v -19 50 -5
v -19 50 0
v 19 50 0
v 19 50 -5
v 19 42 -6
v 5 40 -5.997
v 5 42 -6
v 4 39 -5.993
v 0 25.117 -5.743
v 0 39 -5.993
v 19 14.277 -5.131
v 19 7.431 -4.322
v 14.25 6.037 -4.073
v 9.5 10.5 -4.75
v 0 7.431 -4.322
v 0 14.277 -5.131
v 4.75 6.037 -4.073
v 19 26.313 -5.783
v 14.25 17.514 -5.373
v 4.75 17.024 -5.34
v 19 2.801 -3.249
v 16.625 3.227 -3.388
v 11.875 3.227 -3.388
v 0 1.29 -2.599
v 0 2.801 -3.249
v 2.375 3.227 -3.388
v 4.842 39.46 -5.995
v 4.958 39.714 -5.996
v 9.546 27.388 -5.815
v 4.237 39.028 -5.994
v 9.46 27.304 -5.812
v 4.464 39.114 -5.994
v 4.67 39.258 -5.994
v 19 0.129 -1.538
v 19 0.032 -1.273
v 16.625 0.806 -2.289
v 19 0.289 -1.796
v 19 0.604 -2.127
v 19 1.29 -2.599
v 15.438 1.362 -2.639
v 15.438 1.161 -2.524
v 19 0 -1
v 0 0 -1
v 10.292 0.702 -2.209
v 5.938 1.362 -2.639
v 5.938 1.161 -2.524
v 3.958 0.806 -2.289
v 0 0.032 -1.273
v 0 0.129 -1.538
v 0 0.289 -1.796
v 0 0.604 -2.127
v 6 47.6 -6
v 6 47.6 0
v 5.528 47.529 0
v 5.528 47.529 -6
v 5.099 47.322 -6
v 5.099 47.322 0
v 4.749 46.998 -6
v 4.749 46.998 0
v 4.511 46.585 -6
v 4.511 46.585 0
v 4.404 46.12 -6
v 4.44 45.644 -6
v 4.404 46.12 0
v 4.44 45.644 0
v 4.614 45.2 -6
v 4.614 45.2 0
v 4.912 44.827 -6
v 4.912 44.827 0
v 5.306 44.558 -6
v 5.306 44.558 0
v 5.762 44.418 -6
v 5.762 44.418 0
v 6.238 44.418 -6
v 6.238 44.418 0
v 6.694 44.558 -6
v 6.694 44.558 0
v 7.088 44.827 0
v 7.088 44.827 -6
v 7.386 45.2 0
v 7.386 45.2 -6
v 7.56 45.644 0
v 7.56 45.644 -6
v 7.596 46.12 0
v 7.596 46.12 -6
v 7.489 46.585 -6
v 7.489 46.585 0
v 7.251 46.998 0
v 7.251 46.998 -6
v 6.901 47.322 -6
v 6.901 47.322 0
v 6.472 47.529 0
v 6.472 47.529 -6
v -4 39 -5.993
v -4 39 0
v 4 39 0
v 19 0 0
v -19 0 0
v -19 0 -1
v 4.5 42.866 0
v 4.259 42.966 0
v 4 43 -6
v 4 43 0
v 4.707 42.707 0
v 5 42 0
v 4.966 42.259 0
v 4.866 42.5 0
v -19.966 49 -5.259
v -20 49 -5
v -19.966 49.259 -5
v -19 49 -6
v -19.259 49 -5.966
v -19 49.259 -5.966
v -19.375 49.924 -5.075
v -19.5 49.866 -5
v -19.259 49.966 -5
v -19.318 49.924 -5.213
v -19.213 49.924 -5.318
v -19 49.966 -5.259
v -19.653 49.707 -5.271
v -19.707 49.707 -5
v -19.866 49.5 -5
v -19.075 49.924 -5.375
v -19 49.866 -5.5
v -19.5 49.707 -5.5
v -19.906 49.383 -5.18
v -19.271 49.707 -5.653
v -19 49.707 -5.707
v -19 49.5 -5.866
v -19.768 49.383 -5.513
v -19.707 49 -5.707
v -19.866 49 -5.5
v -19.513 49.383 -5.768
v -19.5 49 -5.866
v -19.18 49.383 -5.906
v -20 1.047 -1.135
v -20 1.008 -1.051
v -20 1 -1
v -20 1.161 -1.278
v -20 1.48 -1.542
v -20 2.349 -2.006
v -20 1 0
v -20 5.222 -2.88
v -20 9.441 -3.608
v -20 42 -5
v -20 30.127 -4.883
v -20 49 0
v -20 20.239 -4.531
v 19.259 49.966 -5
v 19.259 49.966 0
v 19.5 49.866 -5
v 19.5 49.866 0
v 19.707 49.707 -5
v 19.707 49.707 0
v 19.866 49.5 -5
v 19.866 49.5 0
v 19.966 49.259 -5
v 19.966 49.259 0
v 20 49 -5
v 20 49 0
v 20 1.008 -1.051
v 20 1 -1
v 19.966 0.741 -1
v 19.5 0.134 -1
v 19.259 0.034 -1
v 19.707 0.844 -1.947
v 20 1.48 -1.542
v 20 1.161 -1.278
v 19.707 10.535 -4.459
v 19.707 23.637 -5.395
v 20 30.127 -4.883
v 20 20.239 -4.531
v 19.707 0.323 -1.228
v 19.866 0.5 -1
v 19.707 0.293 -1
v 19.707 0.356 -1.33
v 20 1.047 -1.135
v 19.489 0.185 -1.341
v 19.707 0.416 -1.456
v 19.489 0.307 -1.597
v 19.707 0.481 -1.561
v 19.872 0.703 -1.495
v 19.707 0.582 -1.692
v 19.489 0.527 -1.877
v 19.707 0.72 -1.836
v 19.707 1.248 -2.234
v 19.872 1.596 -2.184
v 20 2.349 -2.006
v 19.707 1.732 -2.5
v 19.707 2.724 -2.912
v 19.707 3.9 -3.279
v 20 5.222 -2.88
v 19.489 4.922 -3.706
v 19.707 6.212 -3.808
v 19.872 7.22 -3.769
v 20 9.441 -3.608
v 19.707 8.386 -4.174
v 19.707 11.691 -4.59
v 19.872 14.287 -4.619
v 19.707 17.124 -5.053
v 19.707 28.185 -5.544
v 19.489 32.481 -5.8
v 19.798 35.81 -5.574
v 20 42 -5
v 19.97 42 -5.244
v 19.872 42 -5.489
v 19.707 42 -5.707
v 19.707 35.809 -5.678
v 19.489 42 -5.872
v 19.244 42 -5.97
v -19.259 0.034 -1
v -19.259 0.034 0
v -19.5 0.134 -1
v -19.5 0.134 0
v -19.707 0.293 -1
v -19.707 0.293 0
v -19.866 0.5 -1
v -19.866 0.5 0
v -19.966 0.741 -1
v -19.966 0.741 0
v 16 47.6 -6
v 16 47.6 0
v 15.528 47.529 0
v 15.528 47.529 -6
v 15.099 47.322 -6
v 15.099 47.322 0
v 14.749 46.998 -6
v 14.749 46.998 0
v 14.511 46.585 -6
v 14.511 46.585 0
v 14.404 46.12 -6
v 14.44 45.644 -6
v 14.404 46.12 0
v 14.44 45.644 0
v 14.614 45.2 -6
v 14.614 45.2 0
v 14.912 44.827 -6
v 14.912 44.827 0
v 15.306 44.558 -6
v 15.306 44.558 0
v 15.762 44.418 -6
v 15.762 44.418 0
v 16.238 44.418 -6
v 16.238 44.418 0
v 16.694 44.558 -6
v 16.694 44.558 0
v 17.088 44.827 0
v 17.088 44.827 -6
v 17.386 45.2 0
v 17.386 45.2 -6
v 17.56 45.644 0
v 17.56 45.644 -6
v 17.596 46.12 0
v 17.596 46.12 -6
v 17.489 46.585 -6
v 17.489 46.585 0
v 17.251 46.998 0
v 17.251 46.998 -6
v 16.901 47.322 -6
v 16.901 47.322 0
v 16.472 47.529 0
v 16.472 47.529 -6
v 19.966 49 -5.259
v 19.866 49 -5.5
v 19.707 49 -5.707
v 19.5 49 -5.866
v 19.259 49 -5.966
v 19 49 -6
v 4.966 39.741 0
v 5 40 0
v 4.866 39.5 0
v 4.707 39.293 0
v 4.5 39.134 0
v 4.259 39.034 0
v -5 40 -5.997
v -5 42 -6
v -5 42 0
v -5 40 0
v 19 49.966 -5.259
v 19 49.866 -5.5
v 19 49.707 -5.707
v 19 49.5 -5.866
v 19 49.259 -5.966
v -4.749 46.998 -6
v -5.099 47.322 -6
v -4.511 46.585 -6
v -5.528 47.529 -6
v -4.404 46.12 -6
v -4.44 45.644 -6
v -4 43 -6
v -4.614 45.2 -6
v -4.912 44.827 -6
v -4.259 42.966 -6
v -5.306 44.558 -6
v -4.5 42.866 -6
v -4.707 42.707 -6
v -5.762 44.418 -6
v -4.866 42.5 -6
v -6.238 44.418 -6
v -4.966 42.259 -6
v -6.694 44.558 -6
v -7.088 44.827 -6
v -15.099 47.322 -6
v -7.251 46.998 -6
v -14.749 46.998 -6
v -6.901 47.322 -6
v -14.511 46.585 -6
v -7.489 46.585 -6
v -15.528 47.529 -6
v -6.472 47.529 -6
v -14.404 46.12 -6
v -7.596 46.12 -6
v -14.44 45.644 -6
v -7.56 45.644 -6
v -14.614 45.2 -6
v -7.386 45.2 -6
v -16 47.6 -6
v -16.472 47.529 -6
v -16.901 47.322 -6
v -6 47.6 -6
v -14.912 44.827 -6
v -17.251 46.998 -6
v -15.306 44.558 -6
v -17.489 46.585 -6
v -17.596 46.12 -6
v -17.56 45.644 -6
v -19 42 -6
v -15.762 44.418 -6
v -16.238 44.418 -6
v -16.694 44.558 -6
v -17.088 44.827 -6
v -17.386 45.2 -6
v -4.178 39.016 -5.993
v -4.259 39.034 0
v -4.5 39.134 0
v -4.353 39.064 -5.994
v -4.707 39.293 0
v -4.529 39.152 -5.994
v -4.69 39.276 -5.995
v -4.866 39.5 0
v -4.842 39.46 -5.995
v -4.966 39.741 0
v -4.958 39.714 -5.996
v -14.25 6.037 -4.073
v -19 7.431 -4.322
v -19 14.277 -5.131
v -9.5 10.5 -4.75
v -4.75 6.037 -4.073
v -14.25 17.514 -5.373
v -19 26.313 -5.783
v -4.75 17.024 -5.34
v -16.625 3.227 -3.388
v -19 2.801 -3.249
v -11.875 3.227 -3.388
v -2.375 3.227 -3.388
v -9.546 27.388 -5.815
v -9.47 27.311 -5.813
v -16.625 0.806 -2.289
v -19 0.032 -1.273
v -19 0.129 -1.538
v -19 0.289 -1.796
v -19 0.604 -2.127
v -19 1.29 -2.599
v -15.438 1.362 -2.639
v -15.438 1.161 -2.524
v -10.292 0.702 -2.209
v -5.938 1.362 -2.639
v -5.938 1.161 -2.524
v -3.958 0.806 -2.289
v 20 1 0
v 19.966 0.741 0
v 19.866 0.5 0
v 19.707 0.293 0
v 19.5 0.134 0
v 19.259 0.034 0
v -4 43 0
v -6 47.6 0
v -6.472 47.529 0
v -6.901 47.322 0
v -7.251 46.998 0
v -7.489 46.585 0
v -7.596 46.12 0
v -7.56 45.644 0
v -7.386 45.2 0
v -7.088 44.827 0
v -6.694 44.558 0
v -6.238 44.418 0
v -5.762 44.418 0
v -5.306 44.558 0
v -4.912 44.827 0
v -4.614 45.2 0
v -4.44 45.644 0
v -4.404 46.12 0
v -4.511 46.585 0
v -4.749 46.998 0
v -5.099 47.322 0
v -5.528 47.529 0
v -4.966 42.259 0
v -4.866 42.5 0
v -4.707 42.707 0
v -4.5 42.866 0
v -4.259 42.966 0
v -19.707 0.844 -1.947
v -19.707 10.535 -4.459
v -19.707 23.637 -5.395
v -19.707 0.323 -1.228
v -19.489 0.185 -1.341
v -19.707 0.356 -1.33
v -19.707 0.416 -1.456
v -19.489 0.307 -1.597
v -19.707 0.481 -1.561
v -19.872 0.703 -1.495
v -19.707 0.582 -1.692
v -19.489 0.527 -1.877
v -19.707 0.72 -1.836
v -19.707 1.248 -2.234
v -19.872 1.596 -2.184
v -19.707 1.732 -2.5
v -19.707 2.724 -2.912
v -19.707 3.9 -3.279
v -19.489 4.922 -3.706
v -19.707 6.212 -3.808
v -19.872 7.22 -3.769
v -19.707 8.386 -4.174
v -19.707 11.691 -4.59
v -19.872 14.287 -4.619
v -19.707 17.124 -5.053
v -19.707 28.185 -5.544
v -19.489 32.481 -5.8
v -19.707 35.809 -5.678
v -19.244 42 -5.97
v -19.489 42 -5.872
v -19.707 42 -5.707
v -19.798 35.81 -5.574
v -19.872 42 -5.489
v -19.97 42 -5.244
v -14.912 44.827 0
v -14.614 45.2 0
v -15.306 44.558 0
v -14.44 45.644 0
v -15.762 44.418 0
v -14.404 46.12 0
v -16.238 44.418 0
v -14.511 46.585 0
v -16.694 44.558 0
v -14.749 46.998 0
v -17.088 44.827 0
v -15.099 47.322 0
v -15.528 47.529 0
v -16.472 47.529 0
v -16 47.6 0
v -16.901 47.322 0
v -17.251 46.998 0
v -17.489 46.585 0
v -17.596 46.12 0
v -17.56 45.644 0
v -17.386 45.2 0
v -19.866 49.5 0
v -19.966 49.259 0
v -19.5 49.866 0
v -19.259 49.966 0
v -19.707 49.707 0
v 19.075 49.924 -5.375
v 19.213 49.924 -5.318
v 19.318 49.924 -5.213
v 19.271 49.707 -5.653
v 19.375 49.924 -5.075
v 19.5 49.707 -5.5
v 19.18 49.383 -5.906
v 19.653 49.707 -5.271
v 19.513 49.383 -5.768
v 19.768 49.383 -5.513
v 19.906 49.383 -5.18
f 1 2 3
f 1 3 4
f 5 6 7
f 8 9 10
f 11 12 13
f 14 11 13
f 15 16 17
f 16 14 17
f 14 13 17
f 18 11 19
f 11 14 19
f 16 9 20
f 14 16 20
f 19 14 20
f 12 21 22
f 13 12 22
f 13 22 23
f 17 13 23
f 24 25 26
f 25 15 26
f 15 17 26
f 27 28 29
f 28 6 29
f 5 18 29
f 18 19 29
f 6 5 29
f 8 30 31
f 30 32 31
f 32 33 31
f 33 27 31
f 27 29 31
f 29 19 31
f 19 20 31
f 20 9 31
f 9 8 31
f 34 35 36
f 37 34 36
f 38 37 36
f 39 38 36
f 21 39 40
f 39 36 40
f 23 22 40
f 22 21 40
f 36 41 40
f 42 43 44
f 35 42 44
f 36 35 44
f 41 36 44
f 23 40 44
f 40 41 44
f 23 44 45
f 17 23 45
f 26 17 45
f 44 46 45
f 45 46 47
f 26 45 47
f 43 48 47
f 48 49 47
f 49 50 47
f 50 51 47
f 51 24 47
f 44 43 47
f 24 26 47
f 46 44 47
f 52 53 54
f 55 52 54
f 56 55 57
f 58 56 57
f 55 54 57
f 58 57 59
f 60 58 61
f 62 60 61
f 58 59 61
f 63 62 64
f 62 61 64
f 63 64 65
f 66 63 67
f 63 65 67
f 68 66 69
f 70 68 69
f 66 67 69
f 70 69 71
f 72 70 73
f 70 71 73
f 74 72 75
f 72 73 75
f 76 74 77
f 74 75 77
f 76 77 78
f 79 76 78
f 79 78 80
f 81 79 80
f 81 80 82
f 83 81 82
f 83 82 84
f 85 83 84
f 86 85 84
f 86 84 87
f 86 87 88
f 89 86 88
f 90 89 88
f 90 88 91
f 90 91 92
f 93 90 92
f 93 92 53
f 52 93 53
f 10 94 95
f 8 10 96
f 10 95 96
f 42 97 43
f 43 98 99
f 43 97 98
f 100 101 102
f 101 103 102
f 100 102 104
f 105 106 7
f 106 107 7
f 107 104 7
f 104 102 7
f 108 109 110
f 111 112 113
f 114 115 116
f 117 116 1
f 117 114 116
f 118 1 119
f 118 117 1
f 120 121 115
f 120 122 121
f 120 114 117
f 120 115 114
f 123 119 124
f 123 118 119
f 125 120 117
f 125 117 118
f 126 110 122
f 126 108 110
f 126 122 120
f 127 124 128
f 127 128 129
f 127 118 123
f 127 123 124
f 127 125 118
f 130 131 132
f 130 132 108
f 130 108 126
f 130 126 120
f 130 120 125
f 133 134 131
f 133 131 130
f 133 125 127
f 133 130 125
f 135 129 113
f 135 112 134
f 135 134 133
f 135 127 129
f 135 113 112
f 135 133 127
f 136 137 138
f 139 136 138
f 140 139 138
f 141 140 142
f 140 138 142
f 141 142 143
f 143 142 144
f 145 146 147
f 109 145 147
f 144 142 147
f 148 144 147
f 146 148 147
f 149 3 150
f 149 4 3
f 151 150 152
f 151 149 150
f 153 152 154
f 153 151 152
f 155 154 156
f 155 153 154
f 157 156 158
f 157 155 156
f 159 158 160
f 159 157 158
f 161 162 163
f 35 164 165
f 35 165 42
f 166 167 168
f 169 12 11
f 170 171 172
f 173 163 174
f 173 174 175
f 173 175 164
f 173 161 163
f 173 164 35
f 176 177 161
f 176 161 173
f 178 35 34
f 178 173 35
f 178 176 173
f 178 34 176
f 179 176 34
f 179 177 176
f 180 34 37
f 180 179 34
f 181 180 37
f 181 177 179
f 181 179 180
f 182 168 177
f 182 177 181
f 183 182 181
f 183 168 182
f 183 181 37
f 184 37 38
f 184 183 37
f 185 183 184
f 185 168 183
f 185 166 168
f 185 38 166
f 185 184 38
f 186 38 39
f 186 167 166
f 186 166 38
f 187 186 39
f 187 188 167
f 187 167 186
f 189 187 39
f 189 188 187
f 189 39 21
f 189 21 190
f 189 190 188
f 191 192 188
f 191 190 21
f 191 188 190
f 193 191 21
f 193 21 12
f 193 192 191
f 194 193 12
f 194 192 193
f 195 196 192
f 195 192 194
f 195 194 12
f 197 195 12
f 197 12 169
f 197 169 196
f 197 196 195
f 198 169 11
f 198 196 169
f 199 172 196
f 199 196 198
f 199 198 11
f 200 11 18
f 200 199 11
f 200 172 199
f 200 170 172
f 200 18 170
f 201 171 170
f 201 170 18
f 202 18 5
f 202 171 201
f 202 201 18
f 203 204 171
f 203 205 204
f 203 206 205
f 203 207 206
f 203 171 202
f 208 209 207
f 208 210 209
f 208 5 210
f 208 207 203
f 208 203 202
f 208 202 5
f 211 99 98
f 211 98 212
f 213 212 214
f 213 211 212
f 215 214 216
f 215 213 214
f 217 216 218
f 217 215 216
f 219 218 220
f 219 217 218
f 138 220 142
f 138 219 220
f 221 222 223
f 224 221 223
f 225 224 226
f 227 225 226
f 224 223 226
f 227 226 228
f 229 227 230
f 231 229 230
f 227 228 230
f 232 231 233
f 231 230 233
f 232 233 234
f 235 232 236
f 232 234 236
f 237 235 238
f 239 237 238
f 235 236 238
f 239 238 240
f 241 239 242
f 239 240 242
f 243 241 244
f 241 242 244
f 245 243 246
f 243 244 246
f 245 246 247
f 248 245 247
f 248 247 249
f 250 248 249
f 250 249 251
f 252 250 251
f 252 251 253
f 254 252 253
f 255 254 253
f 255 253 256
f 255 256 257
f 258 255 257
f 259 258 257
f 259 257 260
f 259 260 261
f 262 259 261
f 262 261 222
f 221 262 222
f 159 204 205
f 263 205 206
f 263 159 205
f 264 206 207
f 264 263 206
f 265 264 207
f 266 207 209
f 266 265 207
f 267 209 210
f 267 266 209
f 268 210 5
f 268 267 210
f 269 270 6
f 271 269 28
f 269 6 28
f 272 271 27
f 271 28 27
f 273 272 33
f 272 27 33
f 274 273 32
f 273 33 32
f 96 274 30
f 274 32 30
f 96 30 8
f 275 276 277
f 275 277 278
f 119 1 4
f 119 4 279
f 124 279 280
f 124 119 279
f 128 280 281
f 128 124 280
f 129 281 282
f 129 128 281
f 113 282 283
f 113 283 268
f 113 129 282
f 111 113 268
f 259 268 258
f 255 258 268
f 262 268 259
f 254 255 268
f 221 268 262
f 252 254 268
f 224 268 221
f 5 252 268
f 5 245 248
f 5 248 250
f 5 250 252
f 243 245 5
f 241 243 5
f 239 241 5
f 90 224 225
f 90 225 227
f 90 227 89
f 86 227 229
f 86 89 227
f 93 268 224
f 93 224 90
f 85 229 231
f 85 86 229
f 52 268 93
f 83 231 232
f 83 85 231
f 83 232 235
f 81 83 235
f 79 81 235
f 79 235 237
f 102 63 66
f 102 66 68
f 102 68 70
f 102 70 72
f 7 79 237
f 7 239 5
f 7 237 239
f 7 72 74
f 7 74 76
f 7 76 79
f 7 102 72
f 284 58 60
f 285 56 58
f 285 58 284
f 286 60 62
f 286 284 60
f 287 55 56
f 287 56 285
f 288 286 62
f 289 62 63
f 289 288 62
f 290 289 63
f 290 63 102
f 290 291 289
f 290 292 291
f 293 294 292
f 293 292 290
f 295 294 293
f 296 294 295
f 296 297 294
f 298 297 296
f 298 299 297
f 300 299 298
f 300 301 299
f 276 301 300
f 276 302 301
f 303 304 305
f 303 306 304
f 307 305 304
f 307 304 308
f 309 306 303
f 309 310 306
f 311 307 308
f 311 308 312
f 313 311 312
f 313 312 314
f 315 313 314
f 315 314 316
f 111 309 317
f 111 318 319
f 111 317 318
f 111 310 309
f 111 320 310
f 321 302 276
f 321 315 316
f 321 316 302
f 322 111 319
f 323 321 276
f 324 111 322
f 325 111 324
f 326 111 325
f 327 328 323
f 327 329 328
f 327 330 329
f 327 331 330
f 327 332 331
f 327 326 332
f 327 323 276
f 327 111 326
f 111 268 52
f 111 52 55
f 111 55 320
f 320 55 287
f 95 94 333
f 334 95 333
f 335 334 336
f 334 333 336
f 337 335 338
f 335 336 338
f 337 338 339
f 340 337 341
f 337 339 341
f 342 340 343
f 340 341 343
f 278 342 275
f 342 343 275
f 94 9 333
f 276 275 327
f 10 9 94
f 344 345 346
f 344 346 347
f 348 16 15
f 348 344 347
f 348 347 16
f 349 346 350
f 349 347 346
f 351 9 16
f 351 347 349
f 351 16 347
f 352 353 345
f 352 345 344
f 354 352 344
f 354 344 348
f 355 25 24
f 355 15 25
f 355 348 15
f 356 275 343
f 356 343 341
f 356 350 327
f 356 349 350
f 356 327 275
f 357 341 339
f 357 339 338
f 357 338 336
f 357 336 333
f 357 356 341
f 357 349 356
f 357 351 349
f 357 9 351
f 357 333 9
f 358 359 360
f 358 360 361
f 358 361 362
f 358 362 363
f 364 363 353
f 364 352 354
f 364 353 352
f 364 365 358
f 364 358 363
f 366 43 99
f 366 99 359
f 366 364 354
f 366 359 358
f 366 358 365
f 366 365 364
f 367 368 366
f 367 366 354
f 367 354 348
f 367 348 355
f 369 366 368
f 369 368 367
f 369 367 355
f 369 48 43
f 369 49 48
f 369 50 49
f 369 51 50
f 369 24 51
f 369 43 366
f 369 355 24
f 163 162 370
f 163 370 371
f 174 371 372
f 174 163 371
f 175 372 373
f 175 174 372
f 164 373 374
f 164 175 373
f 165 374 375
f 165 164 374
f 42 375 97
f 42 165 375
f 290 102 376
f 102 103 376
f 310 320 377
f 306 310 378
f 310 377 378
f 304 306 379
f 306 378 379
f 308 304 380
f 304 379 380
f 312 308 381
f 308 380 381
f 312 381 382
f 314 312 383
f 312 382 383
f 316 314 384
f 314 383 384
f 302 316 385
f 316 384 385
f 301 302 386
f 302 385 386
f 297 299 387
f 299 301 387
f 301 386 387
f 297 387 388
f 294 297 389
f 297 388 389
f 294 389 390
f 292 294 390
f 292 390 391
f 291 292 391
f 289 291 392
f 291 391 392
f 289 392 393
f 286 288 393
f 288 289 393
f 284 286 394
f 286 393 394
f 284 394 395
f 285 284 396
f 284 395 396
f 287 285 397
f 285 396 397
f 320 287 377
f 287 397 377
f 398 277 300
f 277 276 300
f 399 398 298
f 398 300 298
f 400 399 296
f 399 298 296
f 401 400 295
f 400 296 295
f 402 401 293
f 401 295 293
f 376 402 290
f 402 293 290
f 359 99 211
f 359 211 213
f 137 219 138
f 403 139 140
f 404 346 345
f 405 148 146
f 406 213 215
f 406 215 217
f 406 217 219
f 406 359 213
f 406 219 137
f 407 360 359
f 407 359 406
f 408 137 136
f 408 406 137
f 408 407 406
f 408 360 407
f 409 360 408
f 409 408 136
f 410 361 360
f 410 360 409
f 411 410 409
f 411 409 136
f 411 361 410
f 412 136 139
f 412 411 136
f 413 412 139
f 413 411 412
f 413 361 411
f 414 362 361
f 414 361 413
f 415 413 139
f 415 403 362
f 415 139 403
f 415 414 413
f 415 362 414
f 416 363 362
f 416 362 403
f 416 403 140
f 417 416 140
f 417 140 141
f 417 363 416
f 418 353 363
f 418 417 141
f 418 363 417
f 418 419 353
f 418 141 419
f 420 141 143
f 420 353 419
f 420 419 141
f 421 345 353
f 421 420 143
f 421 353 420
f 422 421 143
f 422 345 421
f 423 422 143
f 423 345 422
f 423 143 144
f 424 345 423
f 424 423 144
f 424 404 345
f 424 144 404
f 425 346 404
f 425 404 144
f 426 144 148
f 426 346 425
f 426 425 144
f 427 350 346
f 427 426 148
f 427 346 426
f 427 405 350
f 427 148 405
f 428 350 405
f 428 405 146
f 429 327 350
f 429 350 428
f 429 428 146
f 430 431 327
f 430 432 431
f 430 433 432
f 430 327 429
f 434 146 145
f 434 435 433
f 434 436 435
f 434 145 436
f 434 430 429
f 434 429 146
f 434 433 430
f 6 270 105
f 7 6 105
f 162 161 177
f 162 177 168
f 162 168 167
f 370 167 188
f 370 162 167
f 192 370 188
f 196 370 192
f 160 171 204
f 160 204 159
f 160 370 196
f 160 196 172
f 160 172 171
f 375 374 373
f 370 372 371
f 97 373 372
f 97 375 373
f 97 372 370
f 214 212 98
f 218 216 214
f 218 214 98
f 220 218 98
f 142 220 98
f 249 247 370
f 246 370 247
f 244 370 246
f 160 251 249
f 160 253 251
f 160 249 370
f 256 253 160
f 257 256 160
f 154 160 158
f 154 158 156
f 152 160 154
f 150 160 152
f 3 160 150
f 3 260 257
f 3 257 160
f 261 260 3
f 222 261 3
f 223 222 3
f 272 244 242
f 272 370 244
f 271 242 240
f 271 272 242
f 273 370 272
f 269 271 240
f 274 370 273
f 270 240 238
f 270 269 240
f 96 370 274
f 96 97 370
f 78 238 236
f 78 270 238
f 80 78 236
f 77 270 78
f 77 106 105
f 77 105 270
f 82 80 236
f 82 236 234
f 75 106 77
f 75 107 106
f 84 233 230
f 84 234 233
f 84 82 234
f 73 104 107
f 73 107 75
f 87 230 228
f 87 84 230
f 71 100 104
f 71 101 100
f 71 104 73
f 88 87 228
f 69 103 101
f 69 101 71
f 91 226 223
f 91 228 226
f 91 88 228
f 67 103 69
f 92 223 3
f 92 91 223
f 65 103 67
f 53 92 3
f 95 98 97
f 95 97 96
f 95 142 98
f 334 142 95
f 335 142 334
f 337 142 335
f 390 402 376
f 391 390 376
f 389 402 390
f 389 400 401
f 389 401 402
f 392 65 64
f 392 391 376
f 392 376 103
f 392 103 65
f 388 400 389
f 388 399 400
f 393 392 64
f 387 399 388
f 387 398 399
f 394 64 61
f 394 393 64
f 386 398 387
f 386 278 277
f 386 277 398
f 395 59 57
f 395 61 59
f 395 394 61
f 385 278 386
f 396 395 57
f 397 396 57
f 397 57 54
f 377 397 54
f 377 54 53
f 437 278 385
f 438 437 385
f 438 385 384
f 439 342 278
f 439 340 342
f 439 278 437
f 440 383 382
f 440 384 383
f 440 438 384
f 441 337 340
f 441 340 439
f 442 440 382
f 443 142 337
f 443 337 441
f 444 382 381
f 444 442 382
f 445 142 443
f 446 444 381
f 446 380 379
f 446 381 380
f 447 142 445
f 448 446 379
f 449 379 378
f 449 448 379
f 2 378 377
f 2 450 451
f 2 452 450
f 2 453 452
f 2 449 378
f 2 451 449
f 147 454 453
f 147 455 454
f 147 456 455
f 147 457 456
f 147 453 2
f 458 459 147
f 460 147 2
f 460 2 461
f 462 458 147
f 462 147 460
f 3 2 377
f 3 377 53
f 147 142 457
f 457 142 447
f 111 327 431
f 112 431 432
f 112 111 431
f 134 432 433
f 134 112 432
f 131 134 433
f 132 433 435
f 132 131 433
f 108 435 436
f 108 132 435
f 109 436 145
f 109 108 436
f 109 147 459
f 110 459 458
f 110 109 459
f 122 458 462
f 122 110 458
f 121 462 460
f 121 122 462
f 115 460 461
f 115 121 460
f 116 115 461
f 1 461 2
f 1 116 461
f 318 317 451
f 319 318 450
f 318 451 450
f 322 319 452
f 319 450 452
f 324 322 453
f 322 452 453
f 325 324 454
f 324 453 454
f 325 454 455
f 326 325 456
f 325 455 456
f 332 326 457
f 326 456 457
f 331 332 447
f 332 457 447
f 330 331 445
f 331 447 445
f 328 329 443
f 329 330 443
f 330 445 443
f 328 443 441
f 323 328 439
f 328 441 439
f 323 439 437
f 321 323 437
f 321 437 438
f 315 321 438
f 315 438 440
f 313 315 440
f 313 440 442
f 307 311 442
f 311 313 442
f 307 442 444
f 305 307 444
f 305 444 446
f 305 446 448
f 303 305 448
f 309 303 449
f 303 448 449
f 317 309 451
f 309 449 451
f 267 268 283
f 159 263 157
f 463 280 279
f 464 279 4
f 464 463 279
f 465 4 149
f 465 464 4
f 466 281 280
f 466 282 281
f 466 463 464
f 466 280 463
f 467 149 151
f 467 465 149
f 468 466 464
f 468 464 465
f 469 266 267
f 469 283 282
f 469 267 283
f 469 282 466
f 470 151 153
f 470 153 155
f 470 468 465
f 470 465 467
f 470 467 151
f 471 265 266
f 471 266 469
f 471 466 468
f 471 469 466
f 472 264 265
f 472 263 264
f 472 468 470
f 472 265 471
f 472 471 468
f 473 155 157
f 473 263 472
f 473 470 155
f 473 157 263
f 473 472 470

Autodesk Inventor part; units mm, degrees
ref_plane "YZ Plane" through (0, 0, 0) normal (1, 0, 0) x (0, 1, 0)
ref_plane "XZ Plane" through (0, 0, 0) normal (0, 1, 0) x (-1, 0, 0)
ref_plane "XY Plane" through (0, 0, 0) normal (0, 0, 1) x (1, 0, 0)
sketch "スケッチ3" plane through (0, 0, 0) normal (1, 0, 0) x (0, 1, 0)
  line L0 (0, 0) -> (50, 0)
  line L1 (50, 0) -> (50, -6)
  line L2 (50, -6) -> (42, -6)
  line L3 (0, 0) -> (0, -1)
  line L4 (0, -1) -> (0, -6) construction
  line L5 (0, -6) -> (42, -6) construction
  spline S0 degree 2 poles (0, -1) (0, -6) (42, -6) knots 1 1 1 2 2 2
  dimension "d14" = 6
  dimension "d15" = 1
  dimension "d16" = 8
  dimension "d17" = 50
extrude "押し出し2" add sketch "スケッチ3" along normal mid plane 40
sketch "スケッチ4" plane through (20, 50, -6) normal (0, 0, -1) x (-1, 0, 0)
  line L0 (0, -8) -> (0, 0) projected
  line L1 (40, 0) -> (0, 0) projected
  point P0 (20, -50)
  point P1 (14, -4)
  point P2 (14, -4)
  point P3 (4, -4)
  dimension "d20" = 4
  dimension "d21" = 4
  dimension "d22" = 10
hole "穴2" at (6, 46, -6) at (16, 46, -6) direction (0, 0, 1) diameter 3.2 end through all clearance for "Flat Head Machine Screw" size "M3" standard "Ansi Metric M Profile"
fillet "フィレット1" radius 1 9 edges at (20, 10.5, -4.75) (20, 46, -6) (20, 0, -0.5) (-20, 0, -0.5) (-20, 46, -6) (-20, 10.5, -4.75) (0, 50, -6) (-20, 50, -3) (20, 50, -3)
mirror "ミラー1" about plane through (0, 0, 0) normal (1, 0, 0) of "穴2"
sketch "スケッチ5" plane through (-19, 50, 0) normal (0, 0, 1) x (1, 0, 0)
  line L0 (0, -11) -> (38, -11)
  line L1 (38, -11) -> (38, -49)
  line L2 (38, -49) -> (0, -49)
  line L3 (0, -49) -> (0, -11)
  line L4 (0, -11) -> (38, -49) construction
  line L5 (38, -11) -> (0, -49) construction
  line L6 (-1, -49) -> (-1, -1) projected
  line L7 (0, -50) -> (38, -50) projected
  line L8 (14, -11) -> (24, -11)
  line L9 (24, -11) -> (24, -7)
  line L10 (24, -7) -> (14, -7)
  line L11 (14, -7) -> (14, -11)
  line L12 (14, -11) -> (24, -7) construction
  line L13 (24, -11) -> (14, -7) construction
  line L14 (0, 0) -> (38, 0) projected
  point P0 (19, -50)
  point P1 (19, -30)
  point P2 (19, -9)
  point P3 (19, -9)
  point P4 (19, -30)
  point P5 (24, -11)
  point P6 (24, 0)
  point P7 (19, -9)
  dimension "d31" = 38
  dimension "d32" = 38
  dimension "d33" = 1
  dimension "d34" = 1
  dimension "d35" = 10
  dimension "d36" = 4
extrude "押し出し3" cut sketch "スケッチ5" against normal blind 40 contours L11 L10 L9 L0
fillet "フィレット2" radius 1 4 edges at (-5, 39, -2.9967) (-5, 43, -3) (5, 43, -3) (5, 39, -2.9967)
properties part number "base22" material "ABS プラスチック"
